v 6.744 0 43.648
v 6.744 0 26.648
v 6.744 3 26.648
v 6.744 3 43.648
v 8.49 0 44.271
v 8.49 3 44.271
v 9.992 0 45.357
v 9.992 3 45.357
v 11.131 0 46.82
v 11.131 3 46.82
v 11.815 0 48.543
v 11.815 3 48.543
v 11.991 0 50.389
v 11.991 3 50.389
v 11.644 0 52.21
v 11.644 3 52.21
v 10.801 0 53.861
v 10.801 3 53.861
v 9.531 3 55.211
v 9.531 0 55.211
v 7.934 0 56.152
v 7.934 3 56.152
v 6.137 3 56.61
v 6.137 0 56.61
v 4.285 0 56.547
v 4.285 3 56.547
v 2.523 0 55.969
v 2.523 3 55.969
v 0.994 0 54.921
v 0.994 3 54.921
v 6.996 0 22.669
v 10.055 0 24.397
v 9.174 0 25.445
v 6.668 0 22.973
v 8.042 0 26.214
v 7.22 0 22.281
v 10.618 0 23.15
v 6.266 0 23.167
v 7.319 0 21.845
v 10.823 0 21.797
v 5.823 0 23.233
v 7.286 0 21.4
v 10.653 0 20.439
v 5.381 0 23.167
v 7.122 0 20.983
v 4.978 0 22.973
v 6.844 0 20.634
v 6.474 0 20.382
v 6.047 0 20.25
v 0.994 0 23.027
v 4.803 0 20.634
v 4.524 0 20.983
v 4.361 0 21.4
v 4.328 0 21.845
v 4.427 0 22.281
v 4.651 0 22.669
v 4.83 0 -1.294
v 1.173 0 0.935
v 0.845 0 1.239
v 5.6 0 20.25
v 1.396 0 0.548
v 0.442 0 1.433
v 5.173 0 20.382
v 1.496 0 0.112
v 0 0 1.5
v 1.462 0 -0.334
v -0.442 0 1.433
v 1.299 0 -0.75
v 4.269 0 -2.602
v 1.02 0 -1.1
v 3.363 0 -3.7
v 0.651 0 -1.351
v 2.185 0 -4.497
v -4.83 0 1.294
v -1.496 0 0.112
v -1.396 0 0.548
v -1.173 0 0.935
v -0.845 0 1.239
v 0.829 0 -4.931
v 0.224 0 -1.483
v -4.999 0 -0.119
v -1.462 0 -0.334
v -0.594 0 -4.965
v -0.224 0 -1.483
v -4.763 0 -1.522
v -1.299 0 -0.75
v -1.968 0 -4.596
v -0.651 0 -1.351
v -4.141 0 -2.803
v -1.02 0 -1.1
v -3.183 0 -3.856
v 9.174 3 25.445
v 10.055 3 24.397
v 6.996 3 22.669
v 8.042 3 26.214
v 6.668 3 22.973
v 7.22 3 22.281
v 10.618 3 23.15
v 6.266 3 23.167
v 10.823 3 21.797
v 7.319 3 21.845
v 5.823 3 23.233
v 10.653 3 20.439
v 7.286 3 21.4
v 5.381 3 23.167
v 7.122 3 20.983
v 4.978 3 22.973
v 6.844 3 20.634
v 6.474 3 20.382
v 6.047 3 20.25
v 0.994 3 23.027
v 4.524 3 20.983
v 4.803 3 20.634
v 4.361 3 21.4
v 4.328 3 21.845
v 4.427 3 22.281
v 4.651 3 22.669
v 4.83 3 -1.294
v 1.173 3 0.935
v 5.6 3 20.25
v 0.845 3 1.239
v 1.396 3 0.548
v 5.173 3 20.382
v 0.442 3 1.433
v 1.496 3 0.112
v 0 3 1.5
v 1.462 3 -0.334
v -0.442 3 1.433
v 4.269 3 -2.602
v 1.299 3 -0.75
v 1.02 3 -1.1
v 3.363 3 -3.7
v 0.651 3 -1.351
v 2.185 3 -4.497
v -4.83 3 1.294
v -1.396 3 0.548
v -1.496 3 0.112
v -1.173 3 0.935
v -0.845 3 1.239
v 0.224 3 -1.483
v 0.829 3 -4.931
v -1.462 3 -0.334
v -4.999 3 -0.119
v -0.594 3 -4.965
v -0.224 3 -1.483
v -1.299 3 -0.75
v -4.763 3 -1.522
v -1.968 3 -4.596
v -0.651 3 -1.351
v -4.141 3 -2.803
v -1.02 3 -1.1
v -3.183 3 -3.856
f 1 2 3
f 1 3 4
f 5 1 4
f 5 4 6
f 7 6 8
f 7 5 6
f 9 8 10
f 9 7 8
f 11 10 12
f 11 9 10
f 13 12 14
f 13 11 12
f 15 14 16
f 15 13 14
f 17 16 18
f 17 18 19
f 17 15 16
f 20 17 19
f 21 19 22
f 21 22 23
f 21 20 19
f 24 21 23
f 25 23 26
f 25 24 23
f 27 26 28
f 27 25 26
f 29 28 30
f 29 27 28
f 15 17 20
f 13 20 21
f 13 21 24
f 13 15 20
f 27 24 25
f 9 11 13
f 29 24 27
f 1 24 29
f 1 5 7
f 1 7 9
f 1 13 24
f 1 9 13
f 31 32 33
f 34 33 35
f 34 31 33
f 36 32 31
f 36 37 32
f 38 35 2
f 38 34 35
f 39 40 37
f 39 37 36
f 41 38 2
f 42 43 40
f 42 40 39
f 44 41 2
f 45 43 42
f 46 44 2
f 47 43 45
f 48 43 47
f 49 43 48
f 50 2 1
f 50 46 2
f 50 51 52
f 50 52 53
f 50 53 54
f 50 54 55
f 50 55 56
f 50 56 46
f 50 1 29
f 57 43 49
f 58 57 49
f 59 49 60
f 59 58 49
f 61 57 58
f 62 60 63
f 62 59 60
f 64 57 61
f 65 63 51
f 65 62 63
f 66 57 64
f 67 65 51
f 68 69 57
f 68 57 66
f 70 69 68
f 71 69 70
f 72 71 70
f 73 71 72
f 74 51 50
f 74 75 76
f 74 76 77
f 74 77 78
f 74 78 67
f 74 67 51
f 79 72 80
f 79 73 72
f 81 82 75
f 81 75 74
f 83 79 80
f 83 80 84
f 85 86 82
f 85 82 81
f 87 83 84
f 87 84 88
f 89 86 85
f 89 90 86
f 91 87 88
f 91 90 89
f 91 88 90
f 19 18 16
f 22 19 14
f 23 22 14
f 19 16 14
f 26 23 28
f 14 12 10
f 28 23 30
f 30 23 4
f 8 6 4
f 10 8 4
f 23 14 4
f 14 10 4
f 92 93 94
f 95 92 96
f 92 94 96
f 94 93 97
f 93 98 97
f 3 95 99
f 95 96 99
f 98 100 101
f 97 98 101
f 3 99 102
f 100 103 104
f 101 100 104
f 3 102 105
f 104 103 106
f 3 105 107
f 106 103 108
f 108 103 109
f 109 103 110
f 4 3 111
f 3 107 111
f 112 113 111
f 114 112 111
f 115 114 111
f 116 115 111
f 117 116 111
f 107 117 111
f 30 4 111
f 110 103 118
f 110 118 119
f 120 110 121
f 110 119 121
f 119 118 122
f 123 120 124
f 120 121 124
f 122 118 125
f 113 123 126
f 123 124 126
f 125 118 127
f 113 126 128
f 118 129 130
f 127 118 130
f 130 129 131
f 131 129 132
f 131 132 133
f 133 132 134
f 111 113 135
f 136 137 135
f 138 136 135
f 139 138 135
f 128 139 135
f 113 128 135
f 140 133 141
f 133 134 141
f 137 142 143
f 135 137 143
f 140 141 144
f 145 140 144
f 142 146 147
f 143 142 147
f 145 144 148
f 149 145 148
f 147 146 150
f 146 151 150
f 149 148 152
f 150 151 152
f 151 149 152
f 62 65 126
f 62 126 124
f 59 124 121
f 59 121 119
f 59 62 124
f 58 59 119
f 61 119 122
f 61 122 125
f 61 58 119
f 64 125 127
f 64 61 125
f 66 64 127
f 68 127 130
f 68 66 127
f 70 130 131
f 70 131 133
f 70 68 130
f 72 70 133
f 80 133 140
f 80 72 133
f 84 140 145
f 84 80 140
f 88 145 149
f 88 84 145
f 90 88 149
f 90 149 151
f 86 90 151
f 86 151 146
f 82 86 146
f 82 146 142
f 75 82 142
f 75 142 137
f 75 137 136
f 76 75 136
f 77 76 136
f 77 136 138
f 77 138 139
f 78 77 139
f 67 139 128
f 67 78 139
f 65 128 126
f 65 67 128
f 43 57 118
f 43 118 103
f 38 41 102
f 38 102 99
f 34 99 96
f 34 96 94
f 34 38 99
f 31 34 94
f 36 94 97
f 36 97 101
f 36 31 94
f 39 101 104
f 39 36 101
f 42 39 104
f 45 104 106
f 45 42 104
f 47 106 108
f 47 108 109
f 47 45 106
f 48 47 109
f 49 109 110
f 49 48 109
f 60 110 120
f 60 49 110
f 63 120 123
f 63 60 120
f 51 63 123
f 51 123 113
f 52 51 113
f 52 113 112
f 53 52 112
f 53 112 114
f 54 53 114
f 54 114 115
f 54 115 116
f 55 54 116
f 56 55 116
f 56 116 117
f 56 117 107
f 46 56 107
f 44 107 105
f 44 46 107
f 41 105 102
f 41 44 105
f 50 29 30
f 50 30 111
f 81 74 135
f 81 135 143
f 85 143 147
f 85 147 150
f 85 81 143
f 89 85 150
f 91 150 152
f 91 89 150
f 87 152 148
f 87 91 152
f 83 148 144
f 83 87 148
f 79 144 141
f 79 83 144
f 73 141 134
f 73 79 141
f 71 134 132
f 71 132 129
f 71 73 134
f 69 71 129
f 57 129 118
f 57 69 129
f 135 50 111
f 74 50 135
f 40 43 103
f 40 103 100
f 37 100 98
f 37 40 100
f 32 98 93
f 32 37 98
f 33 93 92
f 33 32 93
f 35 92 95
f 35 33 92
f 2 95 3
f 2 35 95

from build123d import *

# Parameters (mm, degrees)
SKETCH1_R           = 1.5
BOSS_EXTRUDE1_DEPTH = 3


with BuildPart() as part:
    # Sketch1 → Boss-Extrude1 (new body)
    with BuildSketch(Plane(origin=(0, 0, 0), x_dir=(1, 0, 0), z_dir=(0, 1, 0))):
        with BuildLine():
            ThreePointArc((10.653057646, -20.439235866), (10.054560804, -24.397448123), (6.743799383, -26.647892869))
            Line((6.743799383, -26.647892869), (6.743799383, -43.647892869))
            ThreePointArc((6.743799383, -43.647892869), (11.280986361, -53.065151094), (0.993799383, -54.921115062))
            Line((0.993799383, -54.921115062), (0.993799383, -43.647892869))
            Line((0.993799383, -43.647892869), (0.993799383, -23.027426317))
            Line((0.993799383, -23.027426317), (-4.829629131, -1.294095226))
            ThreePointArc((-4.829629131, -1.294095226), (-1.294095226, 4.829629131), (4.829629131, 1.294095226))
            Line((4.829629131, 1.294095226), (10.653057646, -20.439235866))
        make_face()
        with Locations(Location((5.823428515, -21.733331092, 0), (0, 0, 270))):
            Circle(SKETCH1_R, mode=Mode.SUBTRACT)
        with Locations(Location((0, 0, 0), (0, 0, 270))):
            Circle(SKETCH1_R, mode=Mode.SUBTRACT)
    extrude(amount=BOSS_EXTRUDE1_DEPTH)


solid = part.part
